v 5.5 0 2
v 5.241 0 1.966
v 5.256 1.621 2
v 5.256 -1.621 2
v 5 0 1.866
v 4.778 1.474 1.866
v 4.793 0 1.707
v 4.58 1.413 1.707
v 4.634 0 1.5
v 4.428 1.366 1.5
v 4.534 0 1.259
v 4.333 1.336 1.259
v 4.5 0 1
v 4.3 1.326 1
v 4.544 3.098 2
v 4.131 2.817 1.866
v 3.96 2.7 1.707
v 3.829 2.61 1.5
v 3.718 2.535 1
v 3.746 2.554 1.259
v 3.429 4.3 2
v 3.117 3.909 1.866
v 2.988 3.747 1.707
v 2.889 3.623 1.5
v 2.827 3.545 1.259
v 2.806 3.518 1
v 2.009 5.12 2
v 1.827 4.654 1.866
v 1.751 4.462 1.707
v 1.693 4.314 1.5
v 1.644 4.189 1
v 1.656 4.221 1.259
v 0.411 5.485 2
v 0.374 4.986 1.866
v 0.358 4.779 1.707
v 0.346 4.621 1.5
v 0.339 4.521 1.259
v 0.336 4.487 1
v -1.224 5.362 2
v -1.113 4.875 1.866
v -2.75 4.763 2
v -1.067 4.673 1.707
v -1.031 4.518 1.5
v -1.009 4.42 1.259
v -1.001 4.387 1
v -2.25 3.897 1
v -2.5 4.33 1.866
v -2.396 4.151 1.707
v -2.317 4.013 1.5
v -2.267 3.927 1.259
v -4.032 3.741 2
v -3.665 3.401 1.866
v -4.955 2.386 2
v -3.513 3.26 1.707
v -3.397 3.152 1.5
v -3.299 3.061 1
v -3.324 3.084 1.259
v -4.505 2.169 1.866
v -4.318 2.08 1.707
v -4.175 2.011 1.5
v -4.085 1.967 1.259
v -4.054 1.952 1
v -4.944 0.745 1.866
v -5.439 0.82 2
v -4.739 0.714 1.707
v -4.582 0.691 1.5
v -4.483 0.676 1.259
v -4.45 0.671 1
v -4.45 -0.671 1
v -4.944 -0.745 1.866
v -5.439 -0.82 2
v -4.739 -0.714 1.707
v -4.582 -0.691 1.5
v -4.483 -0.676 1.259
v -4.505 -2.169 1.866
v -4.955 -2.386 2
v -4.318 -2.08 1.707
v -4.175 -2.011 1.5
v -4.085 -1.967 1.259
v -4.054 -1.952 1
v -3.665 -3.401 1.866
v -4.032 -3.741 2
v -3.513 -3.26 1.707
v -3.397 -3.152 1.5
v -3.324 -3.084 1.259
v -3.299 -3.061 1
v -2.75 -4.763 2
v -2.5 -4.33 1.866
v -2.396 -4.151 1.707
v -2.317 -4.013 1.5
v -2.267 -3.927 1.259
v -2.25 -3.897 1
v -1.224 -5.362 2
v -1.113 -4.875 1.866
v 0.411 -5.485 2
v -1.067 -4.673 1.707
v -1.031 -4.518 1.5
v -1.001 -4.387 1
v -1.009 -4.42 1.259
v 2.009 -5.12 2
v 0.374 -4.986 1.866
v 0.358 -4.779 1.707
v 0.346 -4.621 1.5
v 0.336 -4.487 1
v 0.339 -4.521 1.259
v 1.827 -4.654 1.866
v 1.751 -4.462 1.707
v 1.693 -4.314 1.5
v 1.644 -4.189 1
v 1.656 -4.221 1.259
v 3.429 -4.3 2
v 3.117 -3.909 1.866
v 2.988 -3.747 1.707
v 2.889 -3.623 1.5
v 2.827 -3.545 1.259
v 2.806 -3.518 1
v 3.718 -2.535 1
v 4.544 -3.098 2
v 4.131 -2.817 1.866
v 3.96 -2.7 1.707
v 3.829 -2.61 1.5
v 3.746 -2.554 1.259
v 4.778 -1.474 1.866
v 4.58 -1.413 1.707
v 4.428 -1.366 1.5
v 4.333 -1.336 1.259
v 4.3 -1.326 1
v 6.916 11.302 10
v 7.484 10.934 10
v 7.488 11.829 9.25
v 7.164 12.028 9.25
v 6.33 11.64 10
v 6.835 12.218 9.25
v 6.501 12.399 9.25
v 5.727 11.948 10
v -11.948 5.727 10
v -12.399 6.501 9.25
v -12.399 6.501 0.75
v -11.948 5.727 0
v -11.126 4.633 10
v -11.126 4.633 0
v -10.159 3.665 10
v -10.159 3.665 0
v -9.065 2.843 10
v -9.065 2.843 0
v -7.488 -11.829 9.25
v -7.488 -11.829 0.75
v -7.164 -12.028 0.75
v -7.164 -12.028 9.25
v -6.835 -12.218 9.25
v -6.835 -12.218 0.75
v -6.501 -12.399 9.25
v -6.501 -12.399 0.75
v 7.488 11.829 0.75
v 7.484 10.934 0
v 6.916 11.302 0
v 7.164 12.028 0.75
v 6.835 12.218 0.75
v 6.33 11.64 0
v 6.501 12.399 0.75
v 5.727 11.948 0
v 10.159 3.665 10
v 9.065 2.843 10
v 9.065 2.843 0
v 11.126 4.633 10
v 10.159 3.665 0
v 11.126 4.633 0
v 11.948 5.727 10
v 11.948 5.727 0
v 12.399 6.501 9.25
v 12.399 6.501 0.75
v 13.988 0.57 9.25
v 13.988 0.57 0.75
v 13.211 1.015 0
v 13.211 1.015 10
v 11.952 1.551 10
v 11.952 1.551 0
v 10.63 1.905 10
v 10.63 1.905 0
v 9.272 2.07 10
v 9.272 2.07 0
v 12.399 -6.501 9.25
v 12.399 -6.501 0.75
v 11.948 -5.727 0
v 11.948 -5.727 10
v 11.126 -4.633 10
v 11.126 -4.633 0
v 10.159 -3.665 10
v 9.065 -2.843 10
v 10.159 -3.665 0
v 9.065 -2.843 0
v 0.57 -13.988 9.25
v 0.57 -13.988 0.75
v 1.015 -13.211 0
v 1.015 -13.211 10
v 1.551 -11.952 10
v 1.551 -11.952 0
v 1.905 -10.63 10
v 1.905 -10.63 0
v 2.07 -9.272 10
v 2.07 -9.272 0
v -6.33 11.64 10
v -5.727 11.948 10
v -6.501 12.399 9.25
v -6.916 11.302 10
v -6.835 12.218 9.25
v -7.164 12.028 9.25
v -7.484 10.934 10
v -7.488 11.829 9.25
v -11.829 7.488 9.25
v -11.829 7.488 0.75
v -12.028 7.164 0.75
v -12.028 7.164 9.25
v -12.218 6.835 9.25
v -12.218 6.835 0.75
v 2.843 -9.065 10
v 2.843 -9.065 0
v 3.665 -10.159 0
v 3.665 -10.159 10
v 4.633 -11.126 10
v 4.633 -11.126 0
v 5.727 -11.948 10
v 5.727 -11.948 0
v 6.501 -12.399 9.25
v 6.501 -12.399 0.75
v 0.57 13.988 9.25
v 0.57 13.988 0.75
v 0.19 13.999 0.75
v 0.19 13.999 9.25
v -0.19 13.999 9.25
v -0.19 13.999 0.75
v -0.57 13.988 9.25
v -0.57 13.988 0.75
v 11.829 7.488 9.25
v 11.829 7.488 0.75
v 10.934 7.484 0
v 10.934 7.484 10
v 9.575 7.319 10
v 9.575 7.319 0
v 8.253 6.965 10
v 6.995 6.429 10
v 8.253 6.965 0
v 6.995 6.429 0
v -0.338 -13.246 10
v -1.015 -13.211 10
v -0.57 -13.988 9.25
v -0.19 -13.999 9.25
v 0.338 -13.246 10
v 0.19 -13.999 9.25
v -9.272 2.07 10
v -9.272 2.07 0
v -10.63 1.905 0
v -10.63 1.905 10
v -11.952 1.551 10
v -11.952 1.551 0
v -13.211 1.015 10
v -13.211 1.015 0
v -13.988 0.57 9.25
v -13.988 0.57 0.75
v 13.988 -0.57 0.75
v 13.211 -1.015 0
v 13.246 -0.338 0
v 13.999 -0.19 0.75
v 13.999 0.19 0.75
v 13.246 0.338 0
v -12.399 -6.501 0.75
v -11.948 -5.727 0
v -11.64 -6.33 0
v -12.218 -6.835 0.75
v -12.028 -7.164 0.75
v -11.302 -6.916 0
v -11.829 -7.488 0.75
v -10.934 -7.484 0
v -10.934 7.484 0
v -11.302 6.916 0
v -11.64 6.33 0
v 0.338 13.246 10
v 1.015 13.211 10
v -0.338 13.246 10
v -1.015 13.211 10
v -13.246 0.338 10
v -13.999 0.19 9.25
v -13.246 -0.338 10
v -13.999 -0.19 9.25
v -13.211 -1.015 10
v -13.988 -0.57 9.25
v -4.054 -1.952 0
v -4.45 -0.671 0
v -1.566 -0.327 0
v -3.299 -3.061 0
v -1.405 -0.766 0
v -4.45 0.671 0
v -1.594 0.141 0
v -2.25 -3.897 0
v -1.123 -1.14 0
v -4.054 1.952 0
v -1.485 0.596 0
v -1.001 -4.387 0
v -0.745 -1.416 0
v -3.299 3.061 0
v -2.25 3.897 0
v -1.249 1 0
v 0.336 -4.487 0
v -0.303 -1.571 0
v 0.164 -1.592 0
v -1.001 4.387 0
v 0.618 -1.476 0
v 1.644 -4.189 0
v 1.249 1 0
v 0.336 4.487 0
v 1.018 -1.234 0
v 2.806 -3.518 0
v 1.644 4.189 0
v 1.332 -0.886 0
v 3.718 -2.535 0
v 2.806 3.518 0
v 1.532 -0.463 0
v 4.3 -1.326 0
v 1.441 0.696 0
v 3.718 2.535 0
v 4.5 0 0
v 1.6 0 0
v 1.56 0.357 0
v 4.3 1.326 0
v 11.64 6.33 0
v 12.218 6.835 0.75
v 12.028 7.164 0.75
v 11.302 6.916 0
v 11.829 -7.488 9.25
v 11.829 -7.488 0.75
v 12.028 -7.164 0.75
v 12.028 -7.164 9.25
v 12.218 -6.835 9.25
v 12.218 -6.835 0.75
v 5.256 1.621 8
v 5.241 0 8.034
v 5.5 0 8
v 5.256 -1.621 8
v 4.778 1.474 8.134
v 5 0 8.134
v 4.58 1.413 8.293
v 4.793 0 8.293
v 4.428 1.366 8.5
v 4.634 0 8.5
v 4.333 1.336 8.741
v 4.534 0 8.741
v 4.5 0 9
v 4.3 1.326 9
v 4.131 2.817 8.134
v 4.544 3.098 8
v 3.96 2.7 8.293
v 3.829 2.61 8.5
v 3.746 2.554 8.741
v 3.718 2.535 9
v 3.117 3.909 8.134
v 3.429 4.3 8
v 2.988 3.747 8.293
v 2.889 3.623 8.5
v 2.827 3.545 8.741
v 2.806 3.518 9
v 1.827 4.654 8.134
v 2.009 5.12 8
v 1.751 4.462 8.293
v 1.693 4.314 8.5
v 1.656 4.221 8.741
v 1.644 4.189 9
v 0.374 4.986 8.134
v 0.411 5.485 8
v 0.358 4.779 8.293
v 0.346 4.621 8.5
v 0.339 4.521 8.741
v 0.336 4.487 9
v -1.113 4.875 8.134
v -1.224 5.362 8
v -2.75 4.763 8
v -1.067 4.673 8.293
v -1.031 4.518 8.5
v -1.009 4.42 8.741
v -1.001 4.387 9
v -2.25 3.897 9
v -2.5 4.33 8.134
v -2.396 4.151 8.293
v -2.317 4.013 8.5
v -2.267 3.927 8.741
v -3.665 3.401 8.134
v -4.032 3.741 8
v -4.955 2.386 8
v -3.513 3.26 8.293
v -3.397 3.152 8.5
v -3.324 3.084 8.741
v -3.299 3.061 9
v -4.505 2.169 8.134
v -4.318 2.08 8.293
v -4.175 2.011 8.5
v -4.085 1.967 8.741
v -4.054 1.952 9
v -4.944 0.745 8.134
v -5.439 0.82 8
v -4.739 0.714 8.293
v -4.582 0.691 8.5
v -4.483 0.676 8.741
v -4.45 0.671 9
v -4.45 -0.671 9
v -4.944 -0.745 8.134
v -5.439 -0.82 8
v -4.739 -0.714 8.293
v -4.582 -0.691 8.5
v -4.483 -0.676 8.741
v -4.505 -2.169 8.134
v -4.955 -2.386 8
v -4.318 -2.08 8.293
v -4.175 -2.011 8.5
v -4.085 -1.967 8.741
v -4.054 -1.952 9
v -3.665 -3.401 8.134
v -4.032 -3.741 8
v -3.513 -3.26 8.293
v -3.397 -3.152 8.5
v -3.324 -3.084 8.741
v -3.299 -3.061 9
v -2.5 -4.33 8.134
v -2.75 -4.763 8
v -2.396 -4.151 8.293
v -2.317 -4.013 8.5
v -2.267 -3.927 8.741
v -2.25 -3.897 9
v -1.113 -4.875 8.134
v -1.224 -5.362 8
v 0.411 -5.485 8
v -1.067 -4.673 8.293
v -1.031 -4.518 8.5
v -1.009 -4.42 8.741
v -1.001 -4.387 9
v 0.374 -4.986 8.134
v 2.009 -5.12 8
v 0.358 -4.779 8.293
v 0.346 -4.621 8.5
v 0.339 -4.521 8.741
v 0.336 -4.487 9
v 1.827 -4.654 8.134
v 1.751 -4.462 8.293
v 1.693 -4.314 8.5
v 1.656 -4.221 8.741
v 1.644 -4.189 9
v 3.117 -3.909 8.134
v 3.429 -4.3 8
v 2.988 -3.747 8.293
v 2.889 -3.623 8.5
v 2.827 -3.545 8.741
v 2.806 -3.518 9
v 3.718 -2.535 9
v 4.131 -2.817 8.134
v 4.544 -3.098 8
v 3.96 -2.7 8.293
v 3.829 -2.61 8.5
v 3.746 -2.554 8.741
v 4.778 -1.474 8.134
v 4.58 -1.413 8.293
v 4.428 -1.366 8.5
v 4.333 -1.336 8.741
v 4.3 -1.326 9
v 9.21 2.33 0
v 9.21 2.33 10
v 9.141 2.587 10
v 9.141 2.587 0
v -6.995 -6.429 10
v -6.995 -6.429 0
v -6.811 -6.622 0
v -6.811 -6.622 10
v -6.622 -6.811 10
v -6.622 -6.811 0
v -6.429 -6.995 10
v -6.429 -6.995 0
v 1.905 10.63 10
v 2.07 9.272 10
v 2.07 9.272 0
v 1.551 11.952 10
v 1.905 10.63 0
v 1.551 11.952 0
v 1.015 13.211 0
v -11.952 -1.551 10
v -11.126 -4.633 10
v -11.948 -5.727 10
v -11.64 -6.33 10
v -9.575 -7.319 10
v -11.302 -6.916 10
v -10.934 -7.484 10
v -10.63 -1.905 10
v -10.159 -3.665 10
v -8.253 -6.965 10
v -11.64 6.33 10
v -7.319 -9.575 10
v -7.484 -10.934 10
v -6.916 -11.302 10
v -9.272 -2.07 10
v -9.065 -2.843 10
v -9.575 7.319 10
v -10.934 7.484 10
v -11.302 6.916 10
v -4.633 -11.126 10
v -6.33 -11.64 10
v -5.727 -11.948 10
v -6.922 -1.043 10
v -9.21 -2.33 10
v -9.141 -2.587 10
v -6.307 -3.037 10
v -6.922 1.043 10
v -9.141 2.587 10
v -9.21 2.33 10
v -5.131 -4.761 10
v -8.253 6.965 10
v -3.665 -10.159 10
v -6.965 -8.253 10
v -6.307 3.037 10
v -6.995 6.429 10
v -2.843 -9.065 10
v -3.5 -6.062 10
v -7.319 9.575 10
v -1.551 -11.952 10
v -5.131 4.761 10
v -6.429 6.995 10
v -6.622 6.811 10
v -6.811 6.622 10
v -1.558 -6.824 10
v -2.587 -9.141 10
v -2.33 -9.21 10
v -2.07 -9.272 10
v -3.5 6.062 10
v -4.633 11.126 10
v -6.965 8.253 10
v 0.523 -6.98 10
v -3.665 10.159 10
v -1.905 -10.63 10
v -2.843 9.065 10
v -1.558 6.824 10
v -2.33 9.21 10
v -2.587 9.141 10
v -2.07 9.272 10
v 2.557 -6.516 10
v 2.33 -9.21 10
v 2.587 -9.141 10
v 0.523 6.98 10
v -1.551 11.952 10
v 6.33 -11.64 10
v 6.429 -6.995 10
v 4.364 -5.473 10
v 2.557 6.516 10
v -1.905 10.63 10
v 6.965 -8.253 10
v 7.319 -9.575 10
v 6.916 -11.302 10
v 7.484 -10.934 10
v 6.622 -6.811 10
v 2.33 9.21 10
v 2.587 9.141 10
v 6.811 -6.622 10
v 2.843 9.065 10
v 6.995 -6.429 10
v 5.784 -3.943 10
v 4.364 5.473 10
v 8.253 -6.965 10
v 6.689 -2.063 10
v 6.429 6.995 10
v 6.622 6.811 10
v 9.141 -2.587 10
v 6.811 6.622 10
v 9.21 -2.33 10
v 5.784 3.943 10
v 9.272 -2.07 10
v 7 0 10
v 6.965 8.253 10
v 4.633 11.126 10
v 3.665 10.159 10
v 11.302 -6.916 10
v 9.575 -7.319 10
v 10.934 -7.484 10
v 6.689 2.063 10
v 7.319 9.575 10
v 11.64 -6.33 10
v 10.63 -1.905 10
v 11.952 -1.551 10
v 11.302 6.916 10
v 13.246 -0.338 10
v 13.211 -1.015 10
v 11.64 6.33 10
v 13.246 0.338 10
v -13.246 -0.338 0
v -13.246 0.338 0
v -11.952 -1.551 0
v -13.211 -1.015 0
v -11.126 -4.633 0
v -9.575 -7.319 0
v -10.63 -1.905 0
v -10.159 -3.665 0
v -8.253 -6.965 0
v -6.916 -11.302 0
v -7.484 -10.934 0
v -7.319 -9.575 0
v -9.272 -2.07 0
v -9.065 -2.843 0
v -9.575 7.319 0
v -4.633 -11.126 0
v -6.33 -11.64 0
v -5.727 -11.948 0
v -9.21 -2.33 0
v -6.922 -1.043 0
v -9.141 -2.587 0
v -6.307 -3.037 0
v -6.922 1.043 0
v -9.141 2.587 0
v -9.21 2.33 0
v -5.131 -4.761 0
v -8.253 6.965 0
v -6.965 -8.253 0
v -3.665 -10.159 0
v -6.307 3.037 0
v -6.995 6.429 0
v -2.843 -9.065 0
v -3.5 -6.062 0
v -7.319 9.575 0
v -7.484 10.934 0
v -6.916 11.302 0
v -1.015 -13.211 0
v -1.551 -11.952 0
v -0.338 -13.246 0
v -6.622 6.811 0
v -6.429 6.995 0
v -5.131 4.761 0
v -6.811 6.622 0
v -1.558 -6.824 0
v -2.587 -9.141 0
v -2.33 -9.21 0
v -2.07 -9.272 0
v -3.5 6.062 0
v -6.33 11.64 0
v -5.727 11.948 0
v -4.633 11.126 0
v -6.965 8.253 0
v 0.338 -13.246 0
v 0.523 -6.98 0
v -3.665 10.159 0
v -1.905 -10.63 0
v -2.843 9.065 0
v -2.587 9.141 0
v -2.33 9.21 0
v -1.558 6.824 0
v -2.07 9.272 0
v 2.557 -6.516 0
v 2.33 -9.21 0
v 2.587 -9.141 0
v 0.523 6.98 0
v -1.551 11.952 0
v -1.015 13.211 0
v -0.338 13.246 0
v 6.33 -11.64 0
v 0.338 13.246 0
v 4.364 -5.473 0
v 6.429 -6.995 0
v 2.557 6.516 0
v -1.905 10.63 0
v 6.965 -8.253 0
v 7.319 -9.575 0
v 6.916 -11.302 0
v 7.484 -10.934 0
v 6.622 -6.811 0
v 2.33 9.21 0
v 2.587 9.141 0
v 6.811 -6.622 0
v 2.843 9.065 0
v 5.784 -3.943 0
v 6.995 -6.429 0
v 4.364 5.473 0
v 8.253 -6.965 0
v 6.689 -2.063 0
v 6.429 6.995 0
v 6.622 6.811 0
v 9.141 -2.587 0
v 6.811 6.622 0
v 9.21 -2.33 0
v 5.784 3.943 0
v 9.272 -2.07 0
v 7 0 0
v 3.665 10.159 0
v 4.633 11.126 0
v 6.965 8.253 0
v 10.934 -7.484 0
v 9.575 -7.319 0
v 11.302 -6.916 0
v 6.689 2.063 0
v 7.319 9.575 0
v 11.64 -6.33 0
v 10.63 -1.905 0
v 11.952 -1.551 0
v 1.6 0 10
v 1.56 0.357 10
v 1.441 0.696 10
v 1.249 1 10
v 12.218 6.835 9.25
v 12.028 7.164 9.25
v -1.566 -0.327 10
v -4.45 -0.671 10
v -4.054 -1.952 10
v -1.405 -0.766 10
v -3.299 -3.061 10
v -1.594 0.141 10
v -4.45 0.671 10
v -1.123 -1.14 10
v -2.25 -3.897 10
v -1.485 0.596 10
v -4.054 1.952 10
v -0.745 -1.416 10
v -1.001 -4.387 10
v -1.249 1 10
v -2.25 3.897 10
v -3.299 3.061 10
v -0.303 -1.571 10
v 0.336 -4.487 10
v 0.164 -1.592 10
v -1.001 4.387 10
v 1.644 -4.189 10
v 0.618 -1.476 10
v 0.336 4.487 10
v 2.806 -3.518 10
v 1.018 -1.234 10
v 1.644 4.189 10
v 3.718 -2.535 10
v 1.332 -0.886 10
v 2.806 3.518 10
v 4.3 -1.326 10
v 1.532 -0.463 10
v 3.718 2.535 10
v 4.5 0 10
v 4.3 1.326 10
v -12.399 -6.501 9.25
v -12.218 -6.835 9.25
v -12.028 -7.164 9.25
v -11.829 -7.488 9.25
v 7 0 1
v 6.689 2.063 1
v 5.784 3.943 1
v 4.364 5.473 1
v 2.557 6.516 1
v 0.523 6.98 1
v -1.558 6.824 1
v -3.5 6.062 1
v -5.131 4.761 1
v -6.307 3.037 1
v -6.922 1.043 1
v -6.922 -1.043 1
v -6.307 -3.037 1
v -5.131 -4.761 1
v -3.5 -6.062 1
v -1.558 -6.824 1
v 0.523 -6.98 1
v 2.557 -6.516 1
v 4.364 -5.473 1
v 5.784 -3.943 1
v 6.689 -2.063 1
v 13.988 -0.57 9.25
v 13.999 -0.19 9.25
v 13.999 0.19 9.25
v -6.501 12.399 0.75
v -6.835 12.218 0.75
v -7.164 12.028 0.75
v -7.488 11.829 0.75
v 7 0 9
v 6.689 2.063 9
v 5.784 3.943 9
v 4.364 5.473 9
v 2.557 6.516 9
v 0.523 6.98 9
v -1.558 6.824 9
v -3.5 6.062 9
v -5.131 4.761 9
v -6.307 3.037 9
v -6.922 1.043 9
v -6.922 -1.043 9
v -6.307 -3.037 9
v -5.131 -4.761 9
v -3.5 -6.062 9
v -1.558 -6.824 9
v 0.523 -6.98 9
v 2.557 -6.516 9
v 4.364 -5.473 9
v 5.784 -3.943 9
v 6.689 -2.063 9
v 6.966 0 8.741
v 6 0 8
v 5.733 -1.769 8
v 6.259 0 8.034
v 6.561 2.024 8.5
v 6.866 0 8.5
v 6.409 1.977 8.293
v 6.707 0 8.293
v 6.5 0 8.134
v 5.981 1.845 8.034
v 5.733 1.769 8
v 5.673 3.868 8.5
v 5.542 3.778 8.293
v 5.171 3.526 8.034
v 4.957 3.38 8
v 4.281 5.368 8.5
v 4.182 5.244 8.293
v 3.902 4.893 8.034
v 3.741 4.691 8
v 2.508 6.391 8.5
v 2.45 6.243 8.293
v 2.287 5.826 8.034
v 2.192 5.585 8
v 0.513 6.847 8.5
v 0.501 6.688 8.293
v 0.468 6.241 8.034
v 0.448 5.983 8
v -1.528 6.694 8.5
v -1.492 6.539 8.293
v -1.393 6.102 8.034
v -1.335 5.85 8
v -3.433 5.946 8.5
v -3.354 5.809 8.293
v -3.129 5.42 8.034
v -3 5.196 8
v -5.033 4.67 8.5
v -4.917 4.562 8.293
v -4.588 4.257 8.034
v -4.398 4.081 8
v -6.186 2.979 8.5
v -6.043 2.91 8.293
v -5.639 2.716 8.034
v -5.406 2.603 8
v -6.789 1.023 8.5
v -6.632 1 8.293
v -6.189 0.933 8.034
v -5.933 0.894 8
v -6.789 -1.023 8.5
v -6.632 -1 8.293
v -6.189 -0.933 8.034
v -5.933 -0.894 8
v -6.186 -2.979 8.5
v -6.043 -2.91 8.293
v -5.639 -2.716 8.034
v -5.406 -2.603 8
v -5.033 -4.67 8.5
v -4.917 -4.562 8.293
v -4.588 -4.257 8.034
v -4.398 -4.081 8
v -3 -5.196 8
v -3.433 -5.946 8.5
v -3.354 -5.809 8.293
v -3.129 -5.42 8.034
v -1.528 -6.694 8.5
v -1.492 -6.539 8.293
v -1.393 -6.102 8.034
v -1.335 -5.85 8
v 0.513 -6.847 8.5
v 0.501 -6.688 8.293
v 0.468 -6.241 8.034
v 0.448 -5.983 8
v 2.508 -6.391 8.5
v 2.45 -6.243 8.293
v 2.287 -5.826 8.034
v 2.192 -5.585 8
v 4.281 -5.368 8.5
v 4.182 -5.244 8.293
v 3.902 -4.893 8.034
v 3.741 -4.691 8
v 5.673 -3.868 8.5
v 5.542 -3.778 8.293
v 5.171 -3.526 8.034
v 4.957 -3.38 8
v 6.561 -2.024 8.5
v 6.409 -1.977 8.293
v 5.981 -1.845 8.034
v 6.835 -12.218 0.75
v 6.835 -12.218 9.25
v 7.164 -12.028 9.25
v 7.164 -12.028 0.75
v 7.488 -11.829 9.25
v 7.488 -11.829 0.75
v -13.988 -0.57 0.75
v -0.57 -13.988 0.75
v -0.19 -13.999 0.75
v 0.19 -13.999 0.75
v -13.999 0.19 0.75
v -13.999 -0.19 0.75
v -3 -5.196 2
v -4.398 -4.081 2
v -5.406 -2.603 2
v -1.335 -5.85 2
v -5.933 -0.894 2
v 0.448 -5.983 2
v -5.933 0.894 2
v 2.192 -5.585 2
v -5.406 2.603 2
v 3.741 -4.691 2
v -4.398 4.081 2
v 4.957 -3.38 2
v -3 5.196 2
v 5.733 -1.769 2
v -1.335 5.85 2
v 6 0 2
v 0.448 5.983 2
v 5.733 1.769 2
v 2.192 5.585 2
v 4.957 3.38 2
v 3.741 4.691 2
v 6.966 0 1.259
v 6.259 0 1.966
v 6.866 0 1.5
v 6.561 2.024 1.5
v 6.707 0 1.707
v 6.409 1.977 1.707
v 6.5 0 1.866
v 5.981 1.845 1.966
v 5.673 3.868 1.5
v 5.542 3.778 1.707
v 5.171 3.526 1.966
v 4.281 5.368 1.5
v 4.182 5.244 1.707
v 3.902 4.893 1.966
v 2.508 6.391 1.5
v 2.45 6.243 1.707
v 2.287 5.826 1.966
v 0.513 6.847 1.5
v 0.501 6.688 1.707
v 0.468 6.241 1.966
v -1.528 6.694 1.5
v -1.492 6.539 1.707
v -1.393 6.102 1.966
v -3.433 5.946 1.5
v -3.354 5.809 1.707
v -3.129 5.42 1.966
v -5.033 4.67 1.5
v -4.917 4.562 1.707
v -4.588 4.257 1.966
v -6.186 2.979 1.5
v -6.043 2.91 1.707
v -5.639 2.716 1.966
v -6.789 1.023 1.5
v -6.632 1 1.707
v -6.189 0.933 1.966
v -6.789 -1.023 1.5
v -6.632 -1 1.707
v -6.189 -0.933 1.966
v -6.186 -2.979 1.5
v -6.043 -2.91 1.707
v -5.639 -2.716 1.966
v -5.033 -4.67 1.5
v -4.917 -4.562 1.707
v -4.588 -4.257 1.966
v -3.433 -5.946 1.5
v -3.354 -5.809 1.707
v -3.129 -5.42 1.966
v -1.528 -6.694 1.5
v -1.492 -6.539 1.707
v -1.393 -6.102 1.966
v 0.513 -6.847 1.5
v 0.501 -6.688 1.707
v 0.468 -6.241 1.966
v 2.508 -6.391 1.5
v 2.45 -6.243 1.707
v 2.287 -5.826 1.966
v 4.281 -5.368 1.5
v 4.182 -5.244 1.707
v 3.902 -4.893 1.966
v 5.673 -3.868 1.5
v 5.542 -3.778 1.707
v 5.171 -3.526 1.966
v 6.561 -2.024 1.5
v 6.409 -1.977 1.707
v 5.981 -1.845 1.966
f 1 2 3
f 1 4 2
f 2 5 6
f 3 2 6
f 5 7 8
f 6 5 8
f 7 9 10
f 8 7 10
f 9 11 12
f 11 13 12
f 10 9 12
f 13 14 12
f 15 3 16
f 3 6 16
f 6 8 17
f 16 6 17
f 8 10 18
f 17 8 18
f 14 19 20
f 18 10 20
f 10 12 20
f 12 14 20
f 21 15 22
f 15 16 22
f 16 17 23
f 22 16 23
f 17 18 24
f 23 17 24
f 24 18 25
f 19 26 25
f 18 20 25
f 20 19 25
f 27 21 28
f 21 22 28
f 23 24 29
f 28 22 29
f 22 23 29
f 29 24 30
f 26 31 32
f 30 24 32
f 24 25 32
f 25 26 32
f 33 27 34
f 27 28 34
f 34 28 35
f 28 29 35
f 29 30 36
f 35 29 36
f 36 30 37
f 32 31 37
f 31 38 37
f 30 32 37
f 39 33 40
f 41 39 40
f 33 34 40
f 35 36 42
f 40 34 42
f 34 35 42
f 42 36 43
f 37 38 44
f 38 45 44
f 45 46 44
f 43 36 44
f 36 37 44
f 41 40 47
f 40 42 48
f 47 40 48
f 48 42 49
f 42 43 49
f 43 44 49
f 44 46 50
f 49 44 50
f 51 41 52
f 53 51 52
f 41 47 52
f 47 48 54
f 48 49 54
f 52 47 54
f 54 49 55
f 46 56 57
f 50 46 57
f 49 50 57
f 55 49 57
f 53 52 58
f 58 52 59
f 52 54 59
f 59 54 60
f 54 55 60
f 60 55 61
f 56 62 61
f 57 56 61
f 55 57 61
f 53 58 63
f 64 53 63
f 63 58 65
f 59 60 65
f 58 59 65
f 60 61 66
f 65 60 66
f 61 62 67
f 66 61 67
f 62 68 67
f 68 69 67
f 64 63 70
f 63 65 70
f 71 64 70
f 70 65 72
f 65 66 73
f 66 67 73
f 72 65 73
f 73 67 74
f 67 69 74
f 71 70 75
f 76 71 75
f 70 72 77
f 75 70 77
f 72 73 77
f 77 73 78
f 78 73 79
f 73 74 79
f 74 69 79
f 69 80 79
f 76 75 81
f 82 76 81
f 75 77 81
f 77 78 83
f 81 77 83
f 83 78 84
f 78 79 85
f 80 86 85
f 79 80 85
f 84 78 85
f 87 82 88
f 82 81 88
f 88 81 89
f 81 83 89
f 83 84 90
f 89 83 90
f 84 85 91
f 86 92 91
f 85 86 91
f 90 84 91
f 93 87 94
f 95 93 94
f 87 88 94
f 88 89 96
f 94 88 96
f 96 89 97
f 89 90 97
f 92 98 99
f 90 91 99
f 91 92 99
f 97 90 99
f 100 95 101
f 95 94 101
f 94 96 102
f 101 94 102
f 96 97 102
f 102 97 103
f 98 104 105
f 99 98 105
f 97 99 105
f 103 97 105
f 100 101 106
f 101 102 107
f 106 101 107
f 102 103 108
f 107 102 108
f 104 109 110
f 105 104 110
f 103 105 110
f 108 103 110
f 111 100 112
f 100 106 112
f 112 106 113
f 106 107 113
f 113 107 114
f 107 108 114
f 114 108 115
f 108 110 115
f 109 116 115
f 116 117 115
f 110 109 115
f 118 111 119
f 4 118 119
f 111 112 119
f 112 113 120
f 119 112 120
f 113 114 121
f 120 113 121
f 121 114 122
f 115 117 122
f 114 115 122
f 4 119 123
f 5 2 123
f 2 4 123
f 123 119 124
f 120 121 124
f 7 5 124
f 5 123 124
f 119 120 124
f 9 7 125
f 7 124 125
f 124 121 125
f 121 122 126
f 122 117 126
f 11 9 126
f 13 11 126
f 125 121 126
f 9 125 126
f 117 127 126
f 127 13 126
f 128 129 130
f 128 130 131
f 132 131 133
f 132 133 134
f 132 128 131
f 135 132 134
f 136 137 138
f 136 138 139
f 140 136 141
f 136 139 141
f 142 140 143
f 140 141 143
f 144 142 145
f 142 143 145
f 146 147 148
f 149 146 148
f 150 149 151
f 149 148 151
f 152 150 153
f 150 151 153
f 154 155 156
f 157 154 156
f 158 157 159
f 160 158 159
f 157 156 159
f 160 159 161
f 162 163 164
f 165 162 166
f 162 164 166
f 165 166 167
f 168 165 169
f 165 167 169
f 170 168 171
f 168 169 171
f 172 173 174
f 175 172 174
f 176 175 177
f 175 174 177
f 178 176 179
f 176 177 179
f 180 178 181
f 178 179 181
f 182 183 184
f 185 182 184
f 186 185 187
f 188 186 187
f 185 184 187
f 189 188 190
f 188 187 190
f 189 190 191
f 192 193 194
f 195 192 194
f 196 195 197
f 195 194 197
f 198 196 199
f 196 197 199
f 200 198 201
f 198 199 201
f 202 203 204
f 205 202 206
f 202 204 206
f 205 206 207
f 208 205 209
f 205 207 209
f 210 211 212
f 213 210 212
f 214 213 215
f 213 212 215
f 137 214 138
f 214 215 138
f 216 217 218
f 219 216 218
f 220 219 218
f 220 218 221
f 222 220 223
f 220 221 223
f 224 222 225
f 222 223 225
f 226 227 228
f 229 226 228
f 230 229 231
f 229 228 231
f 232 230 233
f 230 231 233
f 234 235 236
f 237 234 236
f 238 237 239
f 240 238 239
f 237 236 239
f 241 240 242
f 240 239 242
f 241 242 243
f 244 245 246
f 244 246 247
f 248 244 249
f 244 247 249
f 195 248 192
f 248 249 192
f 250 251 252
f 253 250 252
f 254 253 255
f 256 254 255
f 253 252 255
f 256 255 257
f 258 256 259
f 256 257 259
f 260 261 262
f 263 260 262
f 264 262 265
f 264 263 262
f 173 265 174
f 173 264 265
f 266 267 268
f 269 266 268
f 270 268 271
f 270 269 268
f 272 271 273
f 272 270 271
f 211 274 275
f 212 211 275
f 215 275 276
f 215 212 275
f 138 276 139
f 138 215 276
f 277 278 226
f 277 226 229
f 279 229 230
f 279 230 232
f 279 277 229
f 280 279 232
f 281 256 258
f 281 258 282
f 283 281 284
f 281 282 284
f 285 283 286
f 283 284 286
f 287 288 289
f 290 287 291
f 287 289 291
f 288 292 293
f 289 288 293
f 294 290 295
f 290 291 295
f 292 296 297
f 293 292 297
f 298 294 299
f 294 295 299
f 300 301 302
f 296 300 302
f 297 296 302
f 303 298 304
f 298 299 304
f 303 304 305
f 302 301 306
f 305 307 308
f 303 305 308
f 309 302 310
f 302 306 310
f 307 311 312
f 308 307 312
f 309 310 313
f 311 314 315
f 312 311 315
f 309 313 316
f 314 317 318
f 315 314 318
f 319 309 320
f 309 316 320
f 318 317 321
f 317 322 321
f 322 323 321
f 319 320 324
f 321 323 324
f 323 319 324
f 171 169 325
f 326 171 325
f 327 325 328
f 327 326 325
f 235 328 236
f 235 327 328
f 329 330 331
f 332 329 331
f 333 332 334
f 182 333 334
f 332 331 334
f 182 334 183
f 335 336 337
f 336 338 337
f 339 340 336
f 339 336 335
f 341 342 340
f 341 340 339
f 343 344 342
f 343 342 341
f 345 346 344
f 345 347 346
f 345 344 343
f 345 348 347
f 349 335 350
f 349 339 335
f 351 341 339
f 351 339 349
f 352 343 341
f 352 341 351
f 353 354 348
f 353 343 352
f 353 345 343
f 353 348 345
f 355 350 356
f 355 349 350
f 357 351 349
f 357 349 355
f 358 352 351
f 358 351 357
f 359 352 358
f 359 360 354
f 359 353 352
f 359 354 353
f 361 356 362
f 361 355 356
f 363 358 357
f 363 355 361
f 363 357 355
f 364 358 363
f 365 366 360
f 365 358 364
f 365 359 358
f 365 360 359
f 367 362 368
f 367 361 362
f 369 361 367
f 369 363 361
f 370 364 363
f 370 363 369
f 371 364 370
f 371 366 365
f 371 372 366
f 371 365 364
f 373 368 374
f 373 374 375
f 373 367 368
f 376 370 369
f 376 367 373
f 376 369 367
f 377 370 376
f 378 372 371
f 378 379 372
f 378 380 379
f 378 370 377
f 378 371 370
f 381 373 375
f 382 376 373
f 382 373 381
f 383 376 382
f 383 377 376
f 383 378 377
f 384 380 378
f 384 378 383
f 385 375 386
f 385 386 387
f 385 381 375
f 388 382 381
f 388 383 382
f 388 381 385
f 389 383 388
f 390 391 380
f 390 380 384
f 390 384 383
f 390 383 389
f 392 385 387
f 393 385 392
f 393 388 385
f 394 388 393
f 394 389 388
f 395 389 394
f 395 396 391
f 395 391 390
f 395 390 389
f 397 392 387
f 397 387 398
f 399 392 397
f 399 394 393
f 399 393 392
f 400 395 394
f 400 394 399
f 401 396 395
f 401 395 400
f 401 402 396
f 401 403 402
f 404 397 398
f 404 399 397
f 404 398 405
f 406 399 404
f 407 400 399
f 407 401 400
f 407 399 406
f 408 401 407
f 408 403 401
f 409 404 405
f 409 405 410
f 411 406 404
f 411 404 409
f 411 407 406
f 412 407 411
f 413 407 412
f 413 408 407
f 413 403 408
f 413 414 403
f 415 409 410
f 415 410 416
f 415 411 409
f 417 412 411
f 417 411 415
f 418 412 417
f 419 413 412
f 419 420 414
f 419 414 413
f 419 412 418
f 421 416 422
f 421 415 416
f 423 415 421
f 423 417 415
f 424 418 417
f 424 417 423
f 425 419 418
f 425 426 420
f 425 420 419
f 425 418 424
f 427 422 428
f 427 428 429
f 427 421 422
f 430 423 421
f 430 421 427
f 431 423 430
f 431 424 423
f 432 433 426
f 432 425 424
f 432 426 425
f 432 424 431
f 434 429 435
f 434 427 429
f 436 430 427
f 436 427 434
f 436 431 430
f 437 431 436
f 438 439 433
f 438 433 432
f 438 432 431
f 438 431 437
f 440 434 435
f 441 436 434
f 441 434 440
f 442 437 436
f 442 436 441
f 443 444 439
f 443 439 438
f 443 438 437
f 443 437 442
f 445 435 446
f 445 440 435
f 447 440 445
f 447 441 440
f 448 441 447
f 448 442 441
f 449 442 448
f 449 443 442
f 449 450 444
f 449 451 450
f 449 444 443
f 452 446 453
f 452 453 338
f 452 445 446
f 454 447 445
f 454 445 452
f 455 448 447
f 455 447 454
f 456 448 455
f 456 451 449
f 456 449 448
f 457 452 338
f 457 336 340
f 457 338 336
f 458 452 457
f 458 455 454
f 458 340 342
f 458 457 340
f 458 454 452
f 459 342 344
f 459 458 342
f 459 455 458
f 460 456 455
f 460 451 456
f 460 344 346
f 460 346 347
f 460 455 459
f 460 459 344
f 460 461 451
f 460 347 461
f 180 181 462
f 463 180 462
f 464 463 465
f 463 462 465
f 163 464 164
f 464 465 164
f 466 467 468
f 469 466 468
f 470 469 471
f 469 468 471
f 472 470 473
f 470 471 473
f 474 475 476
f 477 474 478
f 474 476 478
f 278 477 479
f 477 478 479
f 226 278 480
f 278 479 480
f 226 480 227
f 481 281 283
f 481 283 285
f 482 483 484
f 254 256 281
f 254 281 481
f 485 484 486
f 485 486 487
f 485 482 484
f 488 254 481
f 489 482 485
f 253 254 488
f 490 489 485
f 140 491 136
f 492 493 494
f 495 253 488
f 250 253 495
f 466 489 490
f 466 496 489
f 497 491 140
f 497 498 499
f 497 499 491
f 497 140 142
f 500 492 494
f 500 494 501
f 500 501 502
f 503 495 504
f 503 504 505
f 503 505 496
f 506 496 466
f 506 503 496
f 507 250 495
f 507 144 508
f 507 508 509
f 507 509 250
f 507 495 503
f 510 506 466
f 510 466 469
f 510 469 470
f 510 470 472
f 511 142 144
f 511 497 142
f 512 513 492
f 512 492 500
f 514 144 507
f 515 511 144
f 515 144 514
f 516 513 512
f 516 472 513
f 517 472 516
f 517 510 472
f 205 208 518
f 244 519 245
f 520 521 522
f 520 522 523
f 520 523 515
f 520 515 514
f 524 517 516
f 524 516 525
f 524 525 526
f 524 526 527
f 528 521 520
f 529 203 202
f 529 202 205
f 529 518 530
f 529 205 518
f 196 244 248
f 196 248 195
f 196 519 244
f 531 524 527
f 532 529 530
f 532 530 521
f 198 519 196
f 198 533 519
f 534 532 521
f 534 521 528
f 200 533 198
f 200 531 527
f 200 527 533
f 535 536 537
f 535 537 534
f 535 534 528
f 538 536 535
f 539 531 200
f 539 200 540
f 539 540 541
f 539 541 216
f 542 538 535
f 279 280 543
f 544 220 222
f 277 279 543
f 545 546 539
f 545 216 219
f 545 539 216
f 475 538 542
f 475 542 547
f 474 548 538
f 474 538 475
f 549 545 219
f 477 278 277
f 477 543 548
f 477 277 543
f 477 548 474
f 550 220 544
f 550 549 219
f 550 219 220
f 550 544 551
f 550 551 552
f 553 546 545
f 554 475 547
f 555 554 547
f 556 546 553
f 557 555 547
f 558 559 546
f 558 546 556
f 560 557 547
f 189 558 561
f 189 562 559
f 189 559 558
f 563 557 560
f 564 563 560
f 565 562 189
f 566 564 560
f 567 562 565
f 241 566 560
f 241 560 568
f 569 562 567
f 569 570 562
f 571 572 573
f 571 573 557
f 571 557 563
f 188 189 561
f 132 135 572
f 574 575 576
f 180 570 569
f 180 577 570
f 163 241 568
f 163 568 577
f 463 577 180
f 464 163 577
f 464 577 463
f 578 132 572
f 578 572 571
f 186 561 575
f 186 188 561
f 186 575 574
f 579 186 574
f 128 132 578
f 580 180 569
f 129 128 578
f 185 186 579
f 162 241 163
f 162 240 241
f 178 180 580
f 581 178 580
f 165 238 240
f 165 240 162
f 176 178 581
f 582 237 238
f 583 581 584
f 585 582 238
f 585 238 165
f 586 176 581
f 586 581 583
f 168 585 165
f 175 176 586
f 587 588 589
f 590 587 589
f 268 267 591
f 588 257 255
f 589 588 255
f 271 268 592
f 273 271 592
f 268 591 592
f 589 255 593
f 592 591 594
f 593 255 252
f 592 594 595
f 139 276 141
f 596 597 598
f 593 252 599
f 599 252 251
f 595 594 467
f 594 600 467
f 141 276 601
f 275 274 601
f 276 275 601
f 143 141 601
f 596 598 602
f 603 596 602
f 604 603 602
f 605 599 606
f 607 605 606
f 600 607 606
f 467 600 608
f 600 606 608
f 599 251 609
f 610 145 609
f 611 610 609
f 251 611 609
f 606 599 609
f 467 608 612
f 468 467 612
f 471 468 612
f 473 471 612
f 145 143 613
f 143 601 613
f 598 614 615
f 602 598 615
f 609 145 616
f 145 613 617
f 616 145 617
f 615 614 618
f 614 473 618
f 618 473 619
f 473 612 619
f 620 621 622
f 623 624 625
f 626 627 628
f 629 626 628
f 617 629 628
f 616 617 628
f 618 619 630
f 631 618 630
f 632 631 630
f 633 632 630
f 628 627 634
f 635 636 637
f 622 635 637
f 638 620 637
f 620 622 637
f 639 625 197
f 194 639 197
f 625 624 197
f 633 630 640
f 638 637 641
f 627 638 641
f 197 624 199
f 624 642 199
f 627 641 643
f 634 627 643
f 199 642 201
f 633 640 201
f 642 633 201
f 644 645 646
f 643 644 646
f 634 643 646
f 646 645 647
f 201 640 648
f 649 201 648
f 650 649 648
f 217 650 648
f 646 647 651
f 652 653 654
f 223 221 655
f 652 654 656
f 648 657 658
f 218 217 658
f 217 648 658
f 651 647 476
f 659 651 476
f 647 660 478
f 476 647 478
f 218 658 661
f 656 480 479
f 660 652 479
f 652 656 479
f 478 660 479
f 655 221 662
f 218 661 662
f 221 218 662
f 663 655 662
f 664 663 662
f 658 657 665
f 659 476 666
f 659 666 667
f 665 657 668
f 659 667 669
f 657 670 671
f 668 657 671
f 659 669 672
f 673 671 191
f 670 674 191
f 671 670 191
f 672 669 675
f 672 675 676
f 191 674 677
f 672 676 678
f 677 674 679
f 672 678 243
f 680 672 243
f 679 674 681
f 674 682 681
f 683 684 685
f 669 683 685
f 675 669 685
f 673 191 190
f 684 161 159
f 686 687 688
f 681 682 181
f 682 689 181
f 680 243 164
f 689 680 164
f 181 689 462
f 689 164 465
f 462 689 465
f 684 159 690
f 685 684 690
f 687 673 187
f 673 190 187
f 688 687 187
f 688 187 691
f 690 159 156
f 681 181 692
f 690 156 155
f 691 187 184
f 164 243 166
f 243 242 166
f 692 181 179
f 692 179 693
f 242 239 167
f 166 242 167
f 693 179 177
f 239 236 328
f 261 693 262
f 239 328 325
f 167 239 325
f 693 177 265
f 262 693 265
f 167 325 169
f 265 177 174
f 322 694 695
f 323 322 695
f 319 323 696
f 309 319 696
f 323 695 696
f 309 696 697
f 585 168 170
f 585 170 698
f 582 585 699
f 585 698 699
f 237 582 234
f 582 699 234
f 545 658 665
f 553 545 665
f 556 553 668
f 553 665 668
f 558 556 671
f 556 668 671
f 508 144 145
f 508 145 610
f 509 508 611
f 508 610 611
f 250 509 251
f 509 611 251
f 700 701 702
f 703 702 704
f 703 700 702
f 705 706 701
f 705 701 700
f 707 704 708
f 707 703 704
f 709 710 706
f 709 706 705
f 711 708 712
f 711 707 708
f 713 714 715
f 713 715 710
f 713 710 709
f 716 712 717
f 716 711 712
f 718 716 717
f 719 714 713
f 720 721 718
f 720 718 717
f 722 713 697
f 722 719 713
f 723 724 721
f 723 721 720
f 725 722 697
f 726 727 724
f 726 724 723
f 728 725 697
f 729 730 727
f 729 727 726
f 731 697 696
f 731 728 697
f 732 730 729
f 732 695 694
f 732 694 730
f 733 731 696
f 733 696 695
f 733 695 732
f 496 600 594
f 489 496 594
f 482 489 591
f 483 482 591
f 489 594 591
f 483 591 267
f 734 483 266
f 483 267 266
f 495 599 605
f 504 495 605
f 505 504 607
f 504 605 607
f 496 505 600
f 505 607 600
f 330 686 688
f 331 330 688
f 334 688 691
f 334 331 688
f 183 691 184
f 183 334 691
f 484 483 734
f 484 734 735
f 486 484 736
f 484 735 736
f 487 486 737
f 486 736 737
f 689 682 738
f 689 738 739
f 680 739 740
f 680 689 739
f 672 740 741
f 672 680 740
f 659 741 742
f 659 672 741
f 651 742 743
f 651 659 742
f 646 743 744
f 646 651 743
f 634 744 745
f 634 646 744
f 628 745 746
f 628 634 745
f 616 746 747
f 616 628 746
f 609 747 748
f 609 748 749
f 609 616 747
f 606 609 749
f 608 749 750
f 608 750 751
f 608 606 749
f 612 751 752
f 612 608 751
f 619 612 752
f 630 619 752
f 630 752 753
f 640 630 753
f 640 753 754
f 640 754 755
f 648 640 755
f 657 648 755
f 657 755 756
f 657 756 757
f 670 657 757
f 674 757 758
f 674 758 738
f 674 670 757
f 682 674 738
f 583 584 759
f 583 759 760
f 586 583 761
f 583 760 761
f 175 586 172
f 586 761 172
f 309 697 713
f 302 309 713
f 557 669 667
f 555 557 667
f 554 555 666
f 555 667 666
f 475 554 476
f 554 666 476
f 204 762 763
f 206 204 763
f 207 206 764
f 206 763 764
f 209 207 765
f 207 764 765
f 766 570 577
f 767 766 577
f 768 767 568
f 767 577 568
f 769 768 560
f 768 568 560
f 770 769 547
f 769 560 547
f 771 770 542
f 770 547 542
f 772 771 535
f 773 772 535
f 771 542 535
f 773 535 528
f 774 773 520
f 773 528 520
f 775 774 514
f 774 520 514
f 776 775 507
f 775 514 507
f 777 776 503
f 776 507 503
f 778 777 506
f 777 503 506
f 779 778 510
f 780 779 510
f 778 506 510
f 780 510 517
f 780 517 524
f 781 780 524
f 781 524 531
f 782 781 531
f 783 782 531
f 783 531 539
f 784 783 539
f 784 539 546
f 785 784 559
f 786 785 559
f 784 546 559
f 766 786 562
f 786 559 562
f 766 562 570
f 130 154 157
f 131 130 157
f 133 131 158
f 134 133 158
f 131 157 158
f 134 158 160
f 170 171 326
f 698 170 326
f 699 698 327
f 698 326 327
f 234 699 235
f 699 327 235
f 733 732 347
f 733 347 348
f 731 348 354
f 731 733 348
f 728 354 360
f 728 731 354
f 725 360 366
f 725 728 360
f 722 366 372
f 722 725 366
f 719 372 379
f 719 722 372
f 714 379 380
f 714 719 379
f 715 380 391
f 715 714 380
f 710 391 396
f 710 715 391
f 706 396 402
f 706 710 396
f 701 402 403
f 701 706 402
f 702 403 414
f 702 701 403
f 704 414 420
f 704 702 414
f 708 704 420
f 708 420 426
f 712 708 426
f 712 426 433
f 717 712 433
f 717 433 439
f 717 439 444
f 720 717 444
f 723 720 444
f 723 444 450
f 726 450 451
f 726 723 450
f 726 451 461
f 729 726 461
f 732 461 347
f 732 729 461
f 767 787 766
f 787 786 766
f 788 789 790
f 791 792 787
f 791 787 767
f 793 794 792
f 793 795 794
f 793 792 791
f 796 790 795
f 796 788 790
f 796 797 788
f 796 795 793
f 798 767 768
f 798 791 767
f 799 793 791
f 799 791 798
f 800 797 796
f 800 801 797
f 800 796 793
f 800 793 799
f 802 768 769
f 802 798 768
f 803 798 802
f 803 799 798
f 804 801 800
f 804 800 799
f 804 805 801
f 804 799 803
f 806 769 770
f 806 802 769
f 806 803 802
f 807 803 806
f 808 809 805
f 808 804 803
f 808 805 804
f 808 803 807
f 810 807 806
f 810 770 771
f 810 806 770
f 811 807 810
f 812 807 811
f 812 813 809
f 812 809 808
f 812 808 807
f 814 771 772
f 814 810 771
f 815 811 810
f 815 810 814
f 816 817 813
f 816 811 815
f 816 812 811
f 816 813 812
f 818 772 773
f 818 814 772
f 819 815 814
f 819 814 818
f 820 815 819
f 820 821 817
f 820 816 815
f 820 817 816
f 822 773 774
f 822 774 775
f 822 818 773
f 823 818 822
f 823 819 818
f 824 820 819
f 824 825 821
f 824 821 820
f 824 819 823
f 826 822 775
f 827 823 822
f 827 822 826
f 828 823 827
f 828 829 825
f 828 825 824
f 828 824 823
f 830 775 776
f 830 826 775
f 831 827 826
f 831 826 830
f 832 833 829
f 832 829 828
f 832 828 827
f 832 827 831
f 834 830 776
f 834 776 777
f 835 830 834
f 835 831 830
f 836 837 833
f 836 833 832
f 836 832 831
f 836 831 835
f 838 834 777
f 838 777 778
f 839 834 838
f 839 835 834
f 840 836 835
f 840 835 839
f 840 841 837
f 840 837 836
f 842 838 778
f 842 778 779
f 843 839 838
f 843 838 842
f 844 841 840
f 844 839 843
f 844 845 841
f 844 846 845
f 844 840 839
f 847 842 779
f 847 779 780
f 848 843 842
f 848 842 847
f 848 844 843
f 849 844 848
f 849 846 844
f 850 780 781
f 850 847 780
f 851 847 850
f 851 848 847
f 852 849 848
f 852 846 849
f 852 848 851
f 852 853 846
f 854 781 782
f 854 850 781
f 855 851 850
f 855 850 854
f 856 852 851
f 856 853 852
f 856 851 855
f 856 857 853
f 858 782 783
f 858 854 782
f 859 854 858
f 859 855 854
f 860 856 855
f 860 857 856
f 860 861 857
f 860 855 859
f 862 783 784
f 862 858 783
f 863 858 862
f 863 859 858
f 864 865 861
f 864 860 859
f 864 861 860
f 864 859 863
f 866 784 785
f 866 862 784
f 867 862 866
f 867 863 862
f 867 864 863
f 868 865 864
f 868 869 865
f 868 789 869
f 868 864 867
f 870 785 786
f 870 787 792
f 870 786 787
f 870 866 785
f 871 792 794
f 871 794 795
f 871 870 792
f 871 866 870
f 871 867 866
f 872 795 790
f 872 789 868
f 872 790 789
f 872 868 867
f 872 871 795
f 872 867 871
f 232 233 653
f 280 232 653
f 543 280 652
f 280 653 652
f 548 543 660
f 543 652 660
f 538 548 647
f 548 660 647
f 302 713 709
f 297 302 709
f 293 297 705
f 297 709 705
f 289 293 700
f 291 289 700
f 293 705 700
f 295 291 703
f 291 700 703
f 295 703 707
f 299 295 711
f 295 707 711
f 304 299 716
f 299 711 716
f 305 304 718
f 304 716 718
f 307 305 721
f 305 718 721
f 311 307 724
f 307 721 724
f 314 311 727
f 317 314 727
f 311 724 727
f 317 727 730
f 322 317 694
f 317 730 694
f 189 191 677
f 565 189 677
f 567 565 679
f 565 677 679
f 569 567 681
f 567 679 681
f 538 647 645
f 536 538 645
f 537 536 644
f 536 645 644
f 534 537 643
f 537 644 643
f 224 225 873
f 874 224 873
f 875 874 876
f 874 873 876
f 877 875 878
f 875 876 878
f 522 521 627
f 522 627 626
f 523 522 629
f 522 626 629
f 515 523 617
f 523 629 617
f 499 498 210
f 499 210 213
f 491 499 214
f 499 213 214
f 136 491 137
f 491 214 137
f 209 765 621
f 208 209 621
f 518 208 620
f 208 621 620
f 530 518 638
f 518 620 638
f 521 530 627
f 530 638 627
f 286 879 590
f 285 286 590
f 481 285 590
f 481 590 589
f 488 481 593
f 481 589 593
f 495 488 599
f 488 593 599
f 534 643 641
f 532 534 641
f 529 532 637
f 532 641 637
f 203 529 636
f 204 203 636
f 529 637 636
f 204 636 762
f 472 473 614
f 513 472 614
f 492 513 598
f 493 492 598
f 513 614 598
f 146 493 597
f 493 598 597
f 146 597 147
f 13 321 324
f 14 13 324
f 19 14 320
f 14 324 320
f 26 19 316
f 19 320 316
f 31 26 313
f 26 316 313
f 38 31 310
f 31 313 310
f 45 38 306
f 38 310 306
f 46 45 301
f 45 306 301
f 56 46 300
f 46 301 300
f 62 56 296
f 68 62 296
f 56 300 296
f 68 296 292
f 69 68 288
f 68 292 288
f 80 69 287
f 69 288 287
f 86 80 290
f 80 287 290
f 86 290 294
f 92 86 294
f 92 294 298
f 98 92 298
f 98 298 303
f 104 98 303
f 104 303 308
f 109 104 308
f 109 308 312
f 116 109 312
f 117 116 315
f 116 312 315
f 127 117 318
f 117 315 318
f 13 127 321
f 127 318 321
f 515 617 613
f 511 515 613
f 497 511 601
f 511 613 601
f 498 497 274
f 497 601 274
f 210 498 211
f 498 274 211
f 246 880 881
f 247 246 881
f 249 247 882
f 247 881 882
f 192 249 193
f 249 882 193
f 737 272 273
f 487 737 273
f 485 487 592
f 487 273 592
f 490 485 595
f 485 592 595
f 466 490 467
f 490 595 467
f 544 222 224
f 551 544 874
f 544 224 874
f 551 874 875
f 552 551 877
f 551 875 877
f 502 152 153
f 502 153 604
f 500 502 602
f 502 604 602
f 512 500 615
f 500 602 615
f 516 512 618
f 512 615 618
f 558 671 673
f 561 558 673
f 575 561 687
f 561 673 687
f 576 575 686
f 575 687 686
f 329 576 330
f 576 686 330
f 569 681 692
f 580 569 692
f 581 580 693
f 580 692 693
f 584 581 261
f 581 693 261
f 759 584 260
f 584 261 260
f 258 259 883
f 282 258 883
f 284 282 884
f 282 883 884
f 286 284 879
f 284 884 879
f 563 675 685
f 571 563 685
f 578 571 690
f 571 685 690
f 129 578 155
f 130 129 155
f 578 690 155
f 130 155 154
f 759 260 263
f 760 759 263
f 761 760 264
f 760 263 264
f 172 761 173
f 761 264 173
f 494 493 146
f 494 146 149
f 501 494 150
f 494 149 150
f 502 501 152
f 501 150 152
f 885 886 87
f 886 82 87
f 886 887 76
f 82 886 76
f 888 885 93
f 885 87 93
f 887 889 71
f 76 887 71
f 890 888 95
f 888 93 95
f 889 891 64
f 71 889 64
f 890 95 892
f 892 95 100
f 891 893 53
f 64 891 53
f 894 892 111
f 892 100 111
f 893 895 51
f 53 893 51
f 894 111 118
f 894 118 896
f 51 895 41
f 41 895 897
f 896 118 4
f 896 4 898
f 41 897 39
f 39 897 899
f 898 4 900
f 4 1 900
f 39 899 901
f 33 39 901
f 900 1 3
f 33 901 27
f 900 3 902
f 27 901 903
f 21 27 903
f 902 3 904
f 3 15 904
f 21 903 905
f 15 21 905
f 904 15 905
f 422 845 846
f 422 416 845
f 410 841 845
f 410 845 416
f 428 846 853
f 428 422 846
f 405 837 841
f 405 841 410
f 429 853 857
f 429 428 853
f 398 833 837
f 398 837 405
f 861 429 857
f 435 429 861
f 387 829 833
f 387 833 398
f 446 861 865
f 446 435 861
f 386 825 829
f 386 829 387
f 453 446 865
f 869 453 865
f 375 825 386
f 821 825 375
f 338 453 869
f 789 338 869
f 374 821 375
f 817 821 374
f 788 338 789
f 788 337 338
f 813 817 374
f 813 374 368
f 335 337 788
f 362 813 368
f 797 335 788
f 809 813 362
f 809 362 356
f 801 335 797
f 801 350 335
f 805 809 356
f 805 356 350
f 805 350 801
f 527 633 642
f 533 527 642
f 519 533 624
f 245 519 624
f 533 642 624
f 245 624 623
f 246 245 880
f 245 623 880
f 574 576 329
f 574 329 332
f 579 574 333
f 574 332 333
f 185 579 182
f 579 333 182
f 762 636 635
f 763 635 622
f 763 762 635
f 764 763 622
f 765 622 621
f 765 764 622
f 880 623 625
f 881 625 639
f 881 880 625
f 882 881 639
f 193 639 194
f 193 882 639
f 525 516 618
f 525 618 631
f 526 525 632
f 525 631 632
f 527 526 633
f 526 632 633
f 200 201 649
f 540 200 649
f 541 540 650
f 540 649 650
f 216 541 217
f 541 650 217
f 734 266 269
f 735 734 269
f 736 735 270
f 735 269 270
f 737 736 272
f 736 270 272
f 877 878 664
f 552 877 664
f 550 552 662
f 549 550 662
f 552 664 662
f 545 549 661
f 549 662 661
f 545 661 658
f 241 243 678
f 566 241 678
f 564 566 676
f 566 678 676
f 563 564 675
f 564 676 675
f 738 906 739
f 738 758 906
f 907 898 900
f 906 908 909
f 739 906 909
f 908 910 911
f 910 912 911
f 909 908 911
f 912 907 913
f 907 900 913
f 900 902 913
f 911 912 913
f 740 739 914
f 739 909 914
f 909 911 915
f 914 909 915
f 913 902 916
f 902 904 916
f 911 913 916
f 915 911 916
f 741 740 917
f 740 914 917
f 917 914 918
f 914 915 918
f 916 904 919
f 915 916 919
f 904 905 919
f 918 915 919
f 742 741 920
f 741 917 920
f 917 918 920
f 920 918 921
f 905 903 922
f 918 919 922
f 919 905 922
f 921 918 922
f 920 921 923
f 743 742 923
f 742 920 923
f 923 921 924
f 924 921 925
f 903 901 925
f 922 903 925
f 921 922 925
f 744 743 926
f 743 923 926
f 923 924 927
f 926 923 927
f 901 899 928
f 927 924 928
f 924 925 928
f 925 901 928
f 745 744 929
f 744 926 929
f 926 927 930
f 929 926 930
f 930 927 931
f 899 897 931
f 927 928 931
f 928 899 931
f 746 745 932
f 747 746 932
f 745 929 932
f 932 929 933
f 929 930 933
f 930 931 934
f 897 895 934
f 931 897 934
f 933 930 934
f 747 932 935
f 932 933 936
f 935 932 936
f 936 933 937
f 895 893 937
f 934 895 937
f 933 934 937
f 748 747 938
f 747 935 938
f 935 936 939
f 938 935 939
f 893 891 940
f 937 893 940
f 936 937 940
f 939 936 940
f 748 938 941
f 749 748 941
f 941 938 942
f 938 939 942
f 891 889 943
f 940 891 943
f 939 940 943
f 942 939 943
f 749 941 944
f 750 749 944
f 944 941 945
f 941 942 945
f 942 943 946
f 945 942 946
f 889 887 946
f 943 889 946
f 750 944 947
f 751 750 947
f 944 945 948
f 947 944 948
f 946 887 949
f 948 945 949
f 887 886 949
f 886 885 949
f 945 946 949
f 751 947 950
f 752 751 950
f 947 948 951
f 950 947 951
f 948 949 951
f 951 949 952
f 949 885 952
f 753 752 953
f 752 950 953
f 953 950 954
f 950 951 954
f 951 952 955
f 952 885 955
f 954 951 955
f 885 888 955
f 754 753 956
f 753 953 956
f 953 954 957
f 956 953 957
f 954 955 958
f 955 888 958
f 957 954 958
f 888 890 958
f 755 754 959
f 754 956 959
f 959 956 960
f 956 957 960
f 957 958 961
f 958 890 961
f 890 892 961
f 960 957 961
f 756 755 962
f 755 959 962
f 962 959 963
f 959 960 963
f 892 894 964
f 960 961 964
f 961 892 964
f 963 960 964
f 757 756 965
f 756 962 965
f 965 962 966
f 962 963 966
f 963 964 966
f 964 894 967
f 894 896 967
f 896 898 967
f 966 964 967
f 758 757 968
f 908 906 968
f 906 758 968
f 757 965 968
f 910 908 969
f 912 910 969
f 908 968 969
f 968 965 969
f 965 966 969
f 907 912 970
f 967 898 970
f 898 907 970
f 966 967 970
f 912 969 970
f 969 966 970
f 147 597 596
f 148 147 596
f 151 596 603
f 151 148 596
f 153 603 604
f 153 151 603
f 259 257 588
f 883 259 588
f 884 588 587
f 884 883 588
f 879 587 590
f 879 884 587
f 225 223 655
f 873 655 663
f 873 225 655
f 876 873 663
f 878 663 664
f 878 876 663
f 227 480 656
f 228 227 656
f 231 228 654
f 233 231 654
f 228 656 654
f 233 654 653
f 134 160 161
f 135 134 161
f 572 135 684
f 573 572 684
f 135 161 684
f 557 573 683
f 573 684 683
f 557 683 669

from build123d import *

# Parameters (mm, degrees)
SKETCH1_R                    = 9.5
BOSS_EXTRUDE1_DEPTH          = 10
CHAMFER1_SIZE                = 0.75
CIRPATTERN1_COUNT            = 12
CHAMFER1_OF_CIRPATTERN1_SIZE = 0.75
SKETCH2_R                    = 7
SKETCH2_R_2                  = 4.5
CUT_EXTRUDE1_DEPTH           = 2
FILLET1_R                    = 1
FILLET1_OF_MIRROR1_R         = 1
CUT_EXTRUDE2_REACH           = 12


with BuildPart() as part:
    # Sketch1 → Boss-Extrude1 (new body)
    with BuildSketch(Plane.XY):
        Circle(SKETCH1_R)
        with BuildLine():
            ThreePointArc((-2.07, 9.271736623), (0, 9.5), (2.07, 9.271736623))
            ThreePointArc((2.07, 9.271736623), (1.625653209, 11.72726856), (0.57, 13.988391616))
            ThreePointArc((0.57, 13.988391616), (0, 14), (-0.57, 13.988391616))
            ThreePointArc((-0.57, 13.988391616), (-1.625653209, 11.72726856), (-2.07, 9.271736623))
        make_face()
    boss_extrude1 = extrude(amount=BOSS_EXTRUDE1_DEPTH)

    # Chamfer1
    chamfer1_edges = [part.edges().sort_by_distance(p)[0] for p in [
        (0, 14, 10),
        (0, 14, 0),
    ]]
    chamfer(chamfer1_edges, length=CHAMFER1_SIZE)

    # CirPattern1: Boss-Extrude1 ×12 about axis
    cirpattern1_axis = Axis((0, 0, 0), (0, 0, 1))
    for i in range(1, CIRPATTERN1_COUNT):
        add(boss_extrude1.rotate(cirpattern1_axis, i * 360 / CIRPATTERN1_COUNT))

    # Chamfer1 of CirPattern1
    chamfer1_of_cirpattern1_edges = [part.edges().sort_by_distance(p)[0] for p in [
        (-7, 12.124355653, 10),
        (-7, 12.124355653, 0),
        (-12.124355653, 7, 10),
        (-12.124355653, 7, 0),
        (-14, 0, 10),
        (-14, 0, 0),
        (-12.124355653, -7, 10),
        (-12.124355653, -7, 0),
        (-7, -12.124355653, 10),
        (-7, -12.124355653, 0),
        (0, -14, 10),
        (0, -14, 0),
        (7, -12.124355653, 10),
        (7, -12.124355653, 0),
        (12.124355653, -7, 10),
        (12.124355653, -7, 0),
        (14, 0, 10),
        (14, 0, 0),
        (12.124355653, 7, 10),
        (12.124355653, 7, 0),
        (7, 12.124355653, 10),
        (7, 12.124355653, 0),
    ]]
    chamfer(chamfer1_of_cirpattern1_edges, length=CHAMFER1_OF_CIRPATTERN1_SIZE)

    # Sketch2 → Cut-Extrude1 (cut)
    with BuildSketch(Plane.XY.offset(10)):
        Circle(SKETCH2_R)
        Circle(SKETCH2_R_2, mode=Mode.SUBTRACT)
    cut_extrude1 = extrude(amount=-CUT_EXTRUDE1_DEPTH, mode=Mode.SUBTRACT)

    # Fillet1
    fillet1_edges = [part.edges().sort_by_distance(p)[0] for p in [
        (-7, 0, 8),
        (-4.5, 0, 8),
    ]]
    fillet(fillet1_edges, radius=FILLET1_R)

    # Mirror1: Cut-Extrude1 across plane
    add(cut_extrude1.mirror(Plane.XY.offset(5)), mode=Mode.SUBTRACT)

    # Fillet1 of Mirror1
    fillet1_of_mirror1_edges = [part.edges().sort_by_distance(p)[0] for p in [
        (-7, 0, 2),
        (-4.5, 0, 2),
    ]]
    fillet(fillet1_of_mirror1_edges, radius=FILLET1_OF_MIRROR1_R)

    # Sketch3 → Cut-Extrude2 (cut, up to next)
    with BuildSketch(Plane.XY.offset(10), mode=Mode.PRIVATE) as cut_extrude2_sk1:
        with BuildLine():
            Line((1.2489996, 1), (-1.2489996, 1))
            ThreePointArc((-1.2489996, 1), (-0.529905954, -1.509701851), (1.6, 0))
            ThreePointArc((1.6, 0), (1.509701851, 0.529905954), (1.2489996, 1))
        make_face()
    cut_extrude2_tool1 = extrude(cut_extrude2_sk1.sketch, amount=-CUT_EXTRUDE2_REACH, mode=Mode.PRIVATE) & part.part
    add(cut_extrude2_tool1.solids().sort_by_distance((0, -0.185603, 10))[0], mode=Mode.SUBTRACT)


solid = part.part
